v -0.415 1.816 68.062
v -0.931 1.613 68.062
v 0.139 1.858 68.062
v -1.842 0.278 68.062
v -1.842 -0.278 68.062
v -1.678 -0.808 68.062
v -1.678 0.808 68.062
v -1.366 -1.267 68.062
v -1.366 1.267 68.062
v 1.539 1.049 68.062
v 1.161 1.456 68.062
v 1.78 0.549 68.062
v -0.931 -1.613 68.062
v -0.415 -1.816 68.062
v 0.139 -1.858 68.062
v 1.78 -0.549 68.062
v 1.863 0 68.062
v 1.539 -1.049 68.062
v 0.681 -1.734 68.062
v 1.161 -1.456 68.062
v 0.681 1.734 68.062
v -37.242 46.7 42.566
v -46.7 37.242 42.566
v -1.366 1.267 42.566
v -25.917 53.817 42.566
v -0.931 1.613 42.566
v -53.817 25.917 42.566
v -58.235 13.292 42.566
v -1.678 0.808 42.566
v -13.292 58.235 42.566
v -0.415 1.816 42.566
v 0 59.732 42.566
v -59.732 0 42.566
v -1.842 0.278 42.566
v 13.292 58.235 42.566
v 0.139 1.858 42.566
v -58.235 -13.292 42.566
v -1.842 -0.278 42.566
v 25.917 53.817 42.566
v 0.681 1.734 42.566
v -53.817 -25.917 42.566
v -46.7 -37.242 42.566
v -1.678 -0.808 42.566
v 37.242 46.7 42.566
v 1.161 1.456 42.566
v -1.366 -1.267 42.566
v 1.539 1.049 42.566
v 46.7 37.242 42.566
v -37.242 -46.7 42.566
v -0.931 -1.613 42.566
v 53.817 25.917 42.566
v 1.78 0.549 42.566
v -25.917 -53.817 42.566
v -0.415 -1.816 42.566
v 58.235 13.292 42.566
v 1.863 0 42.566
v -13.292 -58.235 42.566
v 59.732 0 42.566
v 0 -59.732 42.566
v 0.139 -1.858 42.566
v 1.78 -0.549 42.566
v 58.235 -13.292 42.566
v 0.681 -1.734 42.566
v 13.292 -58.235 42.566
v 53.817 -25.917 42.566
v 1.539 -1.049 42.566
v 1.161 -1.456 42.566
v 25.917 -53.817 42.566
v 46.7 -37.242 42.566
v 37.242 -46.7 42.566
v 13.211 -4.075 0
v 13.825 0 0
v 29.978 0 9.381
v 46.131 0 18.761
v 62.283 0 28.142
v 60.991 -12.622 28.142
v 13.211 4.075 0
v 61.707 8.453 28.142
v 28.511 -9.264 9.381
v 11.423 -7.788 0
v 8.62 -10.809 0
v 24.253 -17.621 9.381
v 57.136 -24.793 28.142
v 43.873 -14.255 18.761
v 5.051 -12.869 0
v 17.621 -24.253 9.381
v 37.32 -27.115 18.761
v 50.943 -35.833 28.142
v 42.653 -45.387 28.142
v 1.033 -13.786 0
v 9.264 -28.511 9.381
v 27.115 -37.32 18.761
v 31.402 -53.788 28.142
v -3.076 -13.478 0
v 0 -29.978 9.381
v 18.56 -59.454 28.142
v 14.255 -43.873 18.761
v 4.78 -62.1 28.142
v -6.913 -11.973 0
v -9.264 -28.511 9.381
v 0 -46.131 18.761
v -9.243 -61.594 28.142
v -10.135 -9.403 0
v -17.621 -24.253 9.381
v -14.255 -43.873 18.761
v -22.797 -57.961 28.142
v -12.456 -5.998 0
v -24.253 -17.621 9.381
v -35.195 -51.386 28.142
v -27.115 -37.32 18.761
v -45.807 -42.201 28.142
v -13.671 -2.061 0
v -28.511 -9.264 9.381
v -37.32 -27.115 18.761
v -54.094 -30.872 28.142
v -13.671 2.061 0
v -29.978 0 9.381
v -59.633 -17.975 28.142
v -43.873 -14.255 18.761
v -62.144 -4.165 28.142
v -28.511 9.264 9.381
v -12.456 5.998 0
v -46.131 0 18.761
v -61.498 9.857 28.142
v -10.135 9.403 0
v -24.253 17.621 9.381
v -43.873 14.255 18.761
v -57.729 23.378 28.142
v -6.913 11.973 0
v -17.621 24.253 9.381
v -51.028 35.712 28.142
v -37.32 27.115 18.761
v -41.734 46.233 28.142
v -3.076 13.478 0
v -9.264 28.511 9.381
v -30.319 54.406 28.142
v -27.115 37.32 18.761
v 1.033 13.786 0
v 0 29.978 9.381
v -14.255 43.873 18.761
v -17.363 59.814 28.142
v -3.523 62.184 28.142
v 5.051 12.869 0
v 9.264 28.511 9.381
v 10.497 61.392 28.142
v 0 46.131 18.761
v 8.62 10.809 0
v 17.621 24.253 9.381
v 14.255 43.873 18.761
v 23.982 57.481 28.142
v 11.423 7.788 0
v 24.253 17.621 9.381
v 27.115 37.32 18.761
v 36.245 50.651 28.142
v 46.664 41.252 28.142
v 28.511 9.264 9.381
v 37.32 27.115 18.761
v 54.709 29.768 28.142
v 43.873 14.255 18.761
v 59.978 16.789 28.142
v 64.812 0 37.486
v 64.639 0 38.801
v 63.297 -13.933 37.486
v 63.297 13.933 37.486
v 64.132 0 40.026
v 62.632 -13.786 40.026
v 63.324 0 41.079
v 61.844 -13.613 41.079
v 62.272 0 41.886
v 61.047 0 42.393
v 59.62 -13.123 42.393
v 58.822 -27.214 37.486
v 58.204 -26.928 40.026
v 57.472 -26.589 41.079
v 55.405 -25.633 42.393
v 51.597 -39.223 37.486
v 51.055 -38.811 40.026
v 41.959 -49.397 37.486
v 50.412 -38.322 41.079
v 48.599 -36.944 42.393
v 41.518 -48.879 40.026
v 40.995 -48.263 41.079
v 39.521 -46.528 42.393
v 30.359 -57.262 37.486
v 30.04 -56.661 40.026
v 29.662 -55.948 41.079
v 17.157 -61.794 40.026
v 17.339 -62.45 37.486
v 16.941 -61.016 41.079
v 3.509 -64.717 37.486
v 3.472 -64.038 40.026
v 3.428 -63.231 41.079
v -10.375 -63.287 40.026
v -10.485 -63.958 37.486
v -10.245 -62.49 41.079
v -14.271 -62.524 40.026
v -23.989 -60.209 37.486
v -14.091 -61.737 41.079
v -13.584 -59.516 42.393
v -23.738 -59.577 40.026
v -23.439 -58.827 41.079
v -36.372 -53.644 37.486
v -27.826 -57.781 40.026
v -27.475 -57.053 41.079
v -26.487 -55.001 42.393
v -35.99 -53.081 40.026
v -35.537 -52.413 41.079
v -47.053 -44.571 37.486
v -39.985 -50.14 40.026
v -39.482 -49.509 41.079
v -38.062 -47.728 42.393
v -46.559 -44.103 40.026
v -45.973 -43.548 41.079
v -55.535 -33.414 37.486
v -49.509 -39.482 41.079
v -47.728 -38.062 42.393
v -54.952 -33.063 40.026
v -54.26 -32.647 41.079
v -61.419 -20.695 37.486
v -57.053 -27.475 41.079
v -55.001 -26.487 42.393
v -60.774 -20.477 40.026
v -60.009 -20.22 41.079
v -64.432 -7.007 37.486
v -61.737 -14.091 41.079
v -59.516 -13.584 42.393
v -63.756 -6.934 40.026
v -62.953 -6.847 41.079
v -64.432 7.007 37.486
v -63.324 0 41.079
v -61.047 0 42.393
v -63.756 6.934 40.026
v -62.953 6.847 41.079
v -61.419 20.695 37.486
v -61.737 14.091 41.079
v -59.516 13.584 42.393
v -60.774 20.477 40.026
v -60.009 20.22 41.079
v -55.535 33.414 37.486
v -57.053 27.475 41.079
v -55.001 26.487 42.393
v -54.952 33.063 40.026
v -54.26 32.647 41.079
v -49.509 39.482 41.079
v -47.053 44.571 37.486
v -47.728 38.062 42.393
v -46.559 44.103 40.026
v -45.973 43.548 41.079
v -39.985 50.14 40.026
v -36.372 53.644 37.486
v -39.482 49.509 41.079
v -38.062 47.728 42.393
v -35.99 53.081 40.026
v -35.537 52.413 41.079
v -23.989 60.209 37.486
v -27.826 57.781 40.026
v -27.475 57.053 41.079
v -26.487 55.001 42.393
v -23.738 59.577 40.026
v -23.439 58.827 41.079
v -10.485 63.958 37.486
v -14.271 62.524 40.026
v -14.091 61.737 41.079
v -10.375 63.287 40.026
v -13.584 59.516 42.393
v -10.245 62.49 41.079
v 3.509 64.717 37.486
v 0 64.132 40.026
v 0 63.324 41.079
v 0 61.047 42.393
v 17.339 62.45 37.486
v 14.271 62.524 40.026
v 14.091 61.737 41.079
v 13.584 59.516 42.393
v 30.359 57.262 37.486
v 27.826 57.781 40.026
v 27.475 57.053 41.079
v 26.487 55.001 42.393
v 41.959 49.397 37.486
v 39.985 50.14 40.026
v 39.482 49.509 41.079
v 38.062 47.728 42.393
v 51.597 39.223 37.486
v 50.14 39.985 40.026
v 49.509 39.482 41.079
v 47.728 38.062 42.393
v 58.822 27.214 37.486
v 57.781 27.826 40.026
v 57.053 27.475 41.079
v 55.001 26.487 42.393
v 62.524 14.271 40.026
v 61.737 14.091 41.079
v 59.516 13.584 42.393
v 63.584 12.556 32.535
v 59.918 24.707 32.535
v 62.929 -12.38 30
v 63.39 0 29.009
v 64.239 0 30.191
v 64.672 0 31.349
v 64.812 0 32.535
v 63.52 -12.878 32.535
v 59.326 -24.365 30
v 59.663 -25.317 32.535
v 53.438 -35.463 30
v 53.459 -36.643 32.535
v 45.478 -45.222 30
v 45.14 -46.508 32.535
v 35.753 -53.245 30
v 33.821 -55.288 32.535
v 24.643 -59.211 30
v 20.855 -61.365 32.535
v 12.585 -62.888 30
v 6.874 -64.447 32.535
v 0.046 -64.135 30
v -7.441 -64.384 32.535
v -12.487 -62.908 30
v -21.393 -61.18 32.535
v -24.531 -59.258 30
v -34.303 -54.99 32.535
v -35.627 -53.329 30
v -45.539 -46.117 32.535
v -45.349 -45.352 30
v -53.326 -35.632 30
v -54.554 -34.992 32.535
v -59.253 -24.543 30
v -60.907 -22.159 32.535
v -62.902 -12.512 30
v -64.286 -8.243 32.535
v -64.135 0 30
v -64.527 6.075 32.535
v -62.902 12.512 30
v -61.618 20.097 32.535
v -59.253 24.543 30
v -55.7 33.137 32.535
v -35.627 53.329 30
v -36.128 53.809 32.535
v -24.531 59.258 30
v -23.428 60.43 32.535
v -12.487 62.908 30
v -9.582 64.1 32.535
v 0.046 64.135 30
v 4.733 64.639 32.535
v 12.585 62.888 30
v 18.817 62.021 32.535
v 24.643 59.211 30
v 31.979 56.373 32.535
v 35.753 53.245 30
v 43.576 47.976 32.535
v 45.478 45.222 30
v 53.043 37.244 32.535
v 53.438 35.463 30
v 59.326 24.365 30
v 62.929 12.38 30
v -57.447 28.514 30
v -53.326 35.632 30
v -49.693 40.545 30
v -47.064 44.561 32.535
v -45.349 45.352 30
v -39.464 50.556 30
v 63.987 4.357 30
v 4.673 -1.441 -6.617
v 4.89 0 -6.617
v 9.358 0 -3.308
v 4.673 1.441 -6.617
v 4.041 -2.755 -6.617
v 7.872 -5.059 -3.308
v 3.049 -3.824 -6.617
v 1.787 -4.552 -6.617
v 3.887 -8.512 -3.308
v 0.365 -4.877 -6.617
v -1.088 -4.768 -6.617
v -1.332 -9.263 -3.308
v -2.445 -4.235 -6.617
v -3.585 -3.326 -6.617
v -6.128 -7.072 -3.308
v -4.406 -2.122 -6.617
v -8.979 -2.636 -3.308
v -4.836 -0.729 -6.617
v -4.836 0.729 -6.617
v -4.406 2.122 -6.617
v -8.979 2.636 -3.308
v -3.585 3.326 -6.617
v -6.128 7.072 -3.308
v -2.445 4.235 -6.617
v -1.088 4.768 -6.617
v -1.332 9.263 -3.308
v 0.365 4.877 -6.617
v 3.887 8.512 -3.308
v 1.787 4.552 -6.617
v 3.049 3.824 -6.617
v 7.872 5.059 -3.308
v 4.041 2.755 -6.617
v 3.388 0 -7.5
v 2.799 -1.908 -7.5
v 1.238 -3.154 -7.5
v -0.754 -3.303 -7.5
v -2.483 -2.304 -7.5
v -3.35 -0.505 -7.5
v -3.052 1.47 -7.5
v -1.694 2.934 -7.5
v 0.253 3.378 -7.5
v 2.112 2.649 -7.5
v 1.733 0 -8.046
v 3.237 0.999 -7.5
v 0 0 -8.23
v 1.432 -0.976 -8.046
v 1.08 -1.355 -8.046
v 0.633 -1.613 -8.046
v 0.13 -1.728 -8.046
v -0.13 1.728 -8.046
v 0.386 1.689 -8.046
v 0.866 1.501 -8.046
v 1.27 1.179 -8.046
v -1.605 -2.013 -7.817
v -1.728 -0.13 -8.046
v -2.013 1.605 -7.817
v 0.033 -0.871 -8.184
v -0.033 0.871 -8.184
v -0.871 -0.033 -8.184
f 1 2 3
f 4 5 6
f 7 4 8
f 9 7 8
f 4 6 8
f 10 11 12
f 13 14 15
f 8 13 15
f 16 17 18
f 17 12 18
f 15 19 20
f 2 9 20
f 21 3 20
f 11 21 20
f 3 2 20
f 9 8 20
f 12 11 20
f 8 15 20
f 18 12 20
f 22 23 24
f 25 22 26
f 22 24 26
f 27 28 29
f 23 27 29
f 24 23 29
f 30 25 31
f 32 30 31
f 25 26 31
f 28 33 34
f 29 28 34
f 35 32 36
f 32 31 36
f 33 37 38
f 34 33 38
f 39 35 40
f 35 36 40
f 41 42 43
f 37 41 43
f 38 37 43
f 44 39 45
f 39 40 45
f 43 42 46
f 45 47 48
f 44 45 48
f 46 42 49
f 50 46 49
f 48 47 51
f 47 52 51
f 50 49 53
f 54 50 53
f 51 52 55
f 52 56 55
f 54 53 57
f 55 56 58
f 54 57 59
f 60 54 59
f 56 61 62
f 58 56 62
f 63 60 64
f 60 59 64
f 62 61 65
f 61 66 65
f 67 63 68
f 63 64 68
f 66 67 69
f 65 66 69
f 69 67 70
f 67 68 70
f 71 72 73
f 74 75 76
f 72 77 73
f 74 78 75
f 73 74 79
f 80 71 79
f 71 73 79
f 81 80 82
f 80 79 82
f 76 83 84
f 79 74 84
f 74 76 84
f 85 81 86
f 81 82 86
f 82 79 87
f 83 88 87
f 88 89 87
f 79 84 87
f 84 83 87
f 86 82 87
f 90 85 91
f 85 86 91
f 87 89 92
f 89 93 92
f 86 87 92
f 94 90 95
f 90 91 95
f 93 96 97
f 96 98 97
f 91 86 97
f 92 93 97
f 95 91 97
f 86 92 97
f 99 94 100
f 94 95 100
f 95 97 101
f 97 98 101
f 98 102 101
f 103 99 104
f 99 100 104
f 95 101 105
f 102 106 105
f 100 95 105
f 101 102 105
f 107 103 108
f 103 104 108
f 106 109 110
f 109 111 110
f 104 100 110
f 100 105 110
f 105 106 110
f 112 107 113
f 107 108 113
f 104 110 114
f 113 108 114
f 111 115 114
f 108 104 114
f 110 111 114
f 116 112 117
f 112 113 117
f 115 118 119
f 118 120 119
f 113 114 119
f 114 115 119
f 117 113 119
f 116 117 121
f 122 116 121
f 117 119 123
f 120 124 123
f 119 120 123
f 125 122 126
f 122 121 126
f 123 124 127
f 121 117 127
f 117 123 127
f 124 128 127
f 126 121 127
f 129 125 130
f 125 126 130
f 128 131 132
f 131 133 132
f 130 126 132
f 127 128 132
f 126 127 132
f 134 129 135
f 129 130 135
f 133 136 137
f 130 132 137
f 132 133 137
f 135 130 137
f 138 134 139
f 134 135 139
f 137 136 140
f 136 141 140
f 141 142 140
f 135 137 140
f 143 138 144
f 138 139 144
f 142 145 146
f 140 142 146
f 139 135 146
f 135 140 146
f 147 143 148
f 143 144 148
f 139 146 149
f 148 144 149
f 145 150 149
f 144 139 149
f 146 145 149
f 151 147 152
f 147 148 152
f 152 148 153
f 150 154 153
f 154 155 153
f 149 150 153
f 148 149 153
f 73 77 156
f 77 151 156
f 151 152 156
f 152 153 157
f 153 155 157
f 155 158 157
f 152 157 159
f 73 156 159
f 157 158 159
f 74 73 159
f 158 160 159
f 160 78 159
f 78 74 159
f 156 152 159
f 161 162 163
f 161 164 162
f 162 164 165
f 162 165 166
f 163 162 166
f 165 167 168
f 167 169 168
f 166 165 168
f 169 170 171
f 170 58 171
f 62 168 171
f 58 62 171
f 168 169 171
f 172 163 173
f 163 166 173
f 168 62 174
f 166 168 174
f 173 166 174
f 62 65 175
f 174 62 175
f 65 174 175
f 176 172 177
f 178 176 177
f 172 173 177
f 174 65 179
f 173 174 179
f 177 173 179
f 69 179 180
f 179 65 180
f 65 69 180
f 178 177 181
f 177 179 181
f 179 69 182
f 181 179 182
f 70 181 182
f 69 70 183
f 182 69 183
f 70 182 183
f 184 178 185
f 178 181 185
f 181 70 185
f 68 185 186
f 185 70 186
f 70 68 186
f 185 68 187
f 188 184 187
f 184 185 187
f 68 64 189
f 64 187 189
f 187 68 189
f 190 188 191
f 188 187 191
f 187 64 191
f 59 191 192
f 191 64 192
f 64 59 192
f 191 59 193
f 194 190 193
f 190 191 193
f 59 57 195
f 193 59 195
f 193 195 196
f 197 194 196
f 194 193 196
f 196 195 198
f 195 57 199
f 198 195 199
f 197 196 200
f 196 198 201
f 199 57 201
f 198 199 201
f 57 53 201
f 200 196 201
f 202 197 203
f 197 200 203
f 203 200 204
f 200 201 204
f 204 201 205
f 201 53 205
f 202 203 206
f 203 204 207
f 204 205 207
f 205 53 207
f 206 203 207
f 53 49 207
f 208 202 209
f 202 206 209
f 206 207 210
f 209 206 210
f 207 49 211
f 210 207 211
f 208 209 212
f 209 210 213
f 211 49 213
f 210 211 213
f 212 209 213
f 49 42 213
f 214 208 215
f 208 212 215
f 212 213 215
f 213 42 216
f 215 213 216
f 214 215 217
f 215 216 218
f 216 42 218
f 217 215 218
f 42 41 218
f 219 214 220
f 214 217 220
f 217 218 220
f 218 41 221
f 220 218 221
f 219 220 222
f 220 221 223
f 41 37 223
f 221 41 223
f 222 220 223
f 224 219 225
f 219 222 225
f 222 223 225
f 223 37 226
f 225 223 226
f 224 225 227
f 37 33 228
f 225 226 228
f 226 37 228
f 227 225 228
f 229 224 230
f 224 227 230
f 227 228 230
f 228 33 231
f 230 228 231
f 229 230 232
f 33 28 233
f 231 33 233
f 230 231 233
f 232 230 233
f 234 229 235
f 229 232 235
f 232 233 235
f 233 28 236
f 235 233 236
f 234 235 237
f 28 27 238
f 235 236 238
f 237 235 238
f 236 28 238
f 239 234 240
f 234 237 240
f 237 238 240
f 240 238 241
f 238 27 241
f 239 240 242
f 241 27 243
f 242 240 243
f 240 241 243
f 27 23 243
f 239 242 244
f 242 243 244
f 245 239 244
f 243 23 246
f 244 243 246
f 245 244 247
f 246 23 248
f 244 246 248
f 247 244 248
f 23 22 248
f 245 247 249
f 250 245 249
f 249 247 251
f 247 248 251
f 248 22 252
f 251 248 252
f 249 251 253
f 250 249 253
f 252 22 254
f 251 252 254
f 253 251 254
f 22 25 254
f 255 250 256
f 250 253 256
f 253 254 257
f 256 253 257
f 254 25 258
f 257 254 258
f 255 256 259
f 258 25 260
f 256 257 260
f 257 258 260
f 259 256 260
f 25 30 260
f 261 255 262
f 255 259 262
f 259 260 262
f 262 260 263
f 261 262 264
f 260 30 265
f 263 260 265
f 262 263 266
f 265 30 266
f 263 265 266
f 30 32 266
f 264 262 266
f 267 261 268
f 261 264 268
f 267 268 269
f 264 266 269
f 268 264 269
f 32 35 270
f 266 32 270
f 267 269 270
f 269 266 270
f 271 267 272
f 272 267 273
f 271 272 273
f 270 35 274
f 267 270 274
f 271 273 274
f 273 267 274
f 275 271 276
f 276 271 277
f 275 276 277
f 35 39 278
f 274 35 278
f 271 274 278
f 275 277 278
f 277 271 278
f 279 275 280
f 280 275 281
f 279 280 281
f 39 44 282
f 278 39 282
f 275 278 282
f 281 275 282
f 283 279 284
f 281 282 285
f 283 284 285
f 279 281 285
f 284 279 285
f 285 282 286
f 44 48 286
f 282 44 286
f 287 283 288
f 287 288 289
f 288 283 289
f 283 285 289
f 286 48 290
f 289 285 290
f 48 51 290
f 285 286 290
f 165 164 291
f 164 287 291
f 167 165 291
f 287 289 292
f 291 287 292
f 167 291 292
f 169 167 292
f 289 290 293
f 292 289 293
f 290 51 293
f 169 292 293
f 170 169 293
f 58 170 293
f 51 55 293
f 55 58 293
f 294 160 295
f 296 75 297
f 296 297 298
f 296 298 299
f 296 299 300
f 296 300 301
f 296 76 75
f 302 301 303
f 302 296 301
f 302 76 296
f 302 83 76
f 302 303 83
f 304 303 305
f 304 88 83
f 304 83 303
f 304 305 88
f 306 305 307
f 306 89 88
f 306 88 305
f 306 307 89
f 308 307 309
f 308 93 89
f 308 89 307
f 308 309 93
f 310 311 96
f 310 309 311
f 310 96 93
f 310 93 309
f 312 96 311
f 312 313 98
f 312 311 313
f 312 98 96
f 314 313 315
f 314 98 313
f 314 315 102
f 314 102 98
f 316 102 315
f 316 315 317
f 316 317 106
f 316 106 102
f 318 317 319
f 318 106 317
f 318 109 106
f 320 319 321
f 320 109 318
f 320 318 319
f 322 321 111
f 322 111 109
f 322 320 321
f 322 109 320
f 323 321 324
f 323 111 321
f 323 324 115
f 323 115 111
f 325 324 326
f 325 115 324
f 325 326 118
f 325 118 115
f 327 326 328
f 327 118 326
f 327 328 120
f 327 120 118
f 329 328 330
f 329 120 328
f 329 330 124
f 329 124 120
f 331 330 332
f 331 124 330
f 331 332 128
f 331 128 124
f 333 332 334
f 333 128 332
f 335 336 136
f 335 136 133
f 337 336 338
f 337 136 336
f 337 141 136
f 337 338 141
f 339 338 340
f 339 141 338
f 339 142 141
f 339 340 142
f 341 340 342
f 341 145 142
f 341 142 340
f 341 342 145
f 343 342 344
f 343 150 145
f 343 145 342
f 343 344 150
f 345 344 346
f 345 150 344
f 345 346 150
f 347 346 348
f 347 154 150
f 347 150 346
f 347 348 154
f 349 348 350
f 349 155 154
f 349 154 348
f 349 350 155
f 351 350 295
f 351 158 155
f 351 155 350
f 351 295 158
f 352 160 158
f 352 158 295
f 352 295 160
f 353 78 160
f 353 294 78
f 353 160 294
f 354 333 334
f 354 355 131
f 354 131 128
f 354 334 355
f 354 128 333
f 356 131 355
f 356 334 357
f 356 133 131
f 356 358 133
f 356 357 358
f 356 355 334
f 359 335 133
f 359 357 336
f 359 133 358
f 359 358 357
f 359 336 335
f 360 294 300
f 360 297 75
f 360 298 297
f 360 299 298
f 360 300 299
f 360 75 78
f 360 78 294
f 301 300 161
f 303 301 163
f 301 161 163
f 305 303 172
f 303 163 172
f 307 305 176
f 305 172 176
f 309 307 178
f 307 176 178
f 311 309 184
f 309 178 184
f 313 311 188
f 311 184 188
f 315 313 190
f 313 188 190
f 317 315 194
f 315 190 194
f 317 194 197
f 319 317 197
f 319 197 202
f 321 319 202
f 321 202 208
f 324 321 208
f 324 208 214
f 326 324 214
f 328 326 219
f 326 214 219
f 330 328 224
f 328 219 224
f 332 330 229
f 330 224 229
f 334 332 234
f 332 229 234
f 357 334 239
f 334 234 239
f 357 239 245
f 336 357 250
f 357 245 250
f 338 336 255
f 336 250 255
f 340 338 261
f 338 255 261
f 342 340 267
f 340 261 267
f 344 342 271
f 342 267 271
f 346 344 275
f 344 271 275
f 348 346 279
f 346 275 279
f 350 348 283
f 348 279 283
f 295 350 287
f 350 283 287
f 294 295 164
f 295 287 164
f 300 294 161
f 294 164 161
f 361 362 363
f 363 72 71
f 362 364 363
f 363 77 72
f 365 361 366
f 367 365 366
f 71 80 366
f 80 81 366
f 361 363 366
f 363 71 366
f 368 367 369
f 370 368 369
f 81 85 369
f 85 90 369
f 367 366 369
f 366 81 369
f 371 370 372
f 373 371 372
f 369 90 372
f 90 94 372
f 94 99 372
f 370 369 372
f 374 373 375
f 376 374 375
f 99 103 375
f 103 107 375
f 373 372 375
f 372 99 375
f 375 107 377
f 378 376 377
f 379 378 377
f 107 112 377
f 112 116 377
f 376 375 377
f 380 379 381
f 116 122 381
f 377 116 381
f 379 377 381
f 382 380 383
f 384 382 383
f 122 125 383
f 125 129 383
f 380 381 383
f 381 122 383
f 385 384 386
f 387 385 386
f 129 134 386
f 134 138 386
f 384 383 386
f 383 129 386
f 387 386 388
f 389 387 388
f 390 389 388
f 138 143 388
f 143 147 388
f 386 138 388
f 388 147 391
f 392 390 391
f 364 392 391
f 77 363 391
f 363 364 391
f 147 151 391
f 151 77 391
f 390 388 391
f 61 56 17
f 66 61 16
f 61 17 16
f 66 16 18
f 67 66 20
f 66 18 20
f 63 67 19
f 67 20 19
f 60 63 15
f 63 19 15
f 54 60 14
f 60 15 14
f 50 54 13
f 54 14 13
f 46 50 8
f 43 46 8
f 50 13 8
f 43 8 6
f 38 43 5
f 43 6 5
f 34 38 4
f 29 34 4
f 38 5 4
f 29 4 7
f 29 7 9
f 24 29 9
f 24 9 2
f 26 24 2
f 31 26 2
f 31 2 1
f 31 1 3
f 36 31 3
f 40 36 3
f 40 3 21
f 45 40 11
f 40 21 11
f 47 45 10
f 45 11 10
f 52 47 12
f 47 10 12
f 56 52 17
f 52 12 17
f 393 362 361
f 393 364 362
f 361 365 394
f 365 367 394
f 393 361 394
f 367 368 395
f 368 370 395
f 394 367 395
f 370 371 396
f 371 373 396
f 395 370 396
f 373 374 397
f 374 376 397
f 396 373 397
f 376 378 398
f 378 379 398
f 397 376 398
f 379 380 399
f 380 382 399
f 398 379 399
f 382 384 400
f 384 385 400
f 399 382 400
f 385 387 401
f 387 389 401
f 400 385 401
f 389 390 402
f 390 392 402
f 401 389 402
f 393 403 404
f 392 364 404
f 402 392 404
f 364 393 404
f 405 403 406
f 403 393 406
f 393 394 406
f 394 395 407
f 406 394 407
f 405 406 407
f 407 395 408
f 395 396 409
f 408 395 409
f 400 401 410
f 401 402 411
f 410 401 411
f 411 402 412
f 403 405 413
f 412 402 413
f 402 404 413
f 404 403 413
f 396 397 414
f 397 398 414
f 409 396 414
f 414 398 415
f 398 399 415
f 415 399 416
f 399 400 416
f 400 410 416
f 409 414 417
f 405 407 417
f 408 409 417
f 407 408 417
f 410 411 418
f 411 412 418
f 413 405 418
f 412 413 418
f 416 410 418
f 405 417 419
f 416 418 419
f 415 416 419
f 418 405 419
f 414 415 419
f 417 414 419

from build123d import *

# Parameters (mm, degrees)
F2_R = 5.08


with BuildPart() as f1:
    # F0 (on Front) → F1 (revolve)
    with BuildSketch(Plane.XZ):
        with BuildLine():
            Line((4.890444, -6.616758), (13.825093, 0))
            Line((13.825093, 0), (64.812168, 29.610341))
            Line((64.812168, 29.610341), (64.812168, 42.566437))
            Line((64.812168, 42.566437), (1.862864, 42.566437))
            Line((1.862864, 42.566437), (1.862864, 68.062365))
            Line((1.862864, 68.062365), (0, 68.062365))
            Line((0, 68.062365), (0, -8.230456))
            ThreePointArc((0, -8.230456), (2.574901, -7.81661), (4.890444, -6.616758))
        make_face()
    revolve(axis=Axis((0, 0, 29.915955), (0, 0, -1)))

    # F2
    f2_edges = [f1.edges().sort_by_distance(p)[0] for p in [
        (-64.812168, 0, 42.566437),
        (-64.812168, 0, 29.610341),
    ]]
    fillet(f2_edges, radius=F2_R)


solid = f1.part
